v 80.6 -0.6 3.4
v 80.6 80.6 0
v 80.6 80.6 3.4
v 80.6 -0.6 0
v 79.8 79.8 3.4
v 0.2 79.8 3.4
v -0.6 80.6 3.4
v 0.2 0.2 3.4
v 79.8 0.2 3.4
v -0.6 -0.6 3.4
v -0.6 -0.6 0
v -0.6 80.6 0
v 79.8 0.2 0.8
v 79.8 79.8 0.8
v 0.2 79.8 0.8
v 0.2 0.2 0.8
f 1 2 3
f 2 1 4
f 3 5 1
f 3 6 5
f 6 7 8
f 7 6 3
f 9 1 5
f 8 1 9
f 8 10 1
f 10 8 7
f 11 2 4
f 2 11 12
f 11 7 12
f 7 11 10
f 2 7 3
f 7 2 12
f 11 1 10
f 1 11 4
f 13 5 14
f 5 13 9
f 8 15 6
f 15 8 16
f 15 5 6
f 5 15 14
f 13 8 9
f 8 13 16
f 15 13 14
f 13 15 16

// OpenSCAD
// source image
image="litho.png";

// lithophane height
//H = 2.6;
H = 2.6;

// dimensions
L = 80;
W = 80;

// border width
T = 1.2;

// bottom height
O = 0.8;

// border inset
C = 0.4;

// scale of image
S = .04;

need_frame = true;
need_crop = true;

module frame() {
    difference() {
        translate([-T/2, -T/2, 0])
            cube([L+T, W+T, H + O]);
        translate([C/2, C/2, 0])
            cube([L-C, W-C, H+O*2]);
    }
    
        cube([L, W, O]);
}

	if(need_crop){
		intersection()
		{
				cube([L,W, H*2]);
				translate([L/2, W/2, O])
				scale([S, S, H/100])
					surface(file = image, center = true, invert = false, convexity = 5);
		}
	}
	else{
		translate([L/2, W/2, O])
				scale([S, S, H/100])
					surface(file = image, center = true, invert = false, convexity = 5);
	}


if(need_frame)
	frame();
